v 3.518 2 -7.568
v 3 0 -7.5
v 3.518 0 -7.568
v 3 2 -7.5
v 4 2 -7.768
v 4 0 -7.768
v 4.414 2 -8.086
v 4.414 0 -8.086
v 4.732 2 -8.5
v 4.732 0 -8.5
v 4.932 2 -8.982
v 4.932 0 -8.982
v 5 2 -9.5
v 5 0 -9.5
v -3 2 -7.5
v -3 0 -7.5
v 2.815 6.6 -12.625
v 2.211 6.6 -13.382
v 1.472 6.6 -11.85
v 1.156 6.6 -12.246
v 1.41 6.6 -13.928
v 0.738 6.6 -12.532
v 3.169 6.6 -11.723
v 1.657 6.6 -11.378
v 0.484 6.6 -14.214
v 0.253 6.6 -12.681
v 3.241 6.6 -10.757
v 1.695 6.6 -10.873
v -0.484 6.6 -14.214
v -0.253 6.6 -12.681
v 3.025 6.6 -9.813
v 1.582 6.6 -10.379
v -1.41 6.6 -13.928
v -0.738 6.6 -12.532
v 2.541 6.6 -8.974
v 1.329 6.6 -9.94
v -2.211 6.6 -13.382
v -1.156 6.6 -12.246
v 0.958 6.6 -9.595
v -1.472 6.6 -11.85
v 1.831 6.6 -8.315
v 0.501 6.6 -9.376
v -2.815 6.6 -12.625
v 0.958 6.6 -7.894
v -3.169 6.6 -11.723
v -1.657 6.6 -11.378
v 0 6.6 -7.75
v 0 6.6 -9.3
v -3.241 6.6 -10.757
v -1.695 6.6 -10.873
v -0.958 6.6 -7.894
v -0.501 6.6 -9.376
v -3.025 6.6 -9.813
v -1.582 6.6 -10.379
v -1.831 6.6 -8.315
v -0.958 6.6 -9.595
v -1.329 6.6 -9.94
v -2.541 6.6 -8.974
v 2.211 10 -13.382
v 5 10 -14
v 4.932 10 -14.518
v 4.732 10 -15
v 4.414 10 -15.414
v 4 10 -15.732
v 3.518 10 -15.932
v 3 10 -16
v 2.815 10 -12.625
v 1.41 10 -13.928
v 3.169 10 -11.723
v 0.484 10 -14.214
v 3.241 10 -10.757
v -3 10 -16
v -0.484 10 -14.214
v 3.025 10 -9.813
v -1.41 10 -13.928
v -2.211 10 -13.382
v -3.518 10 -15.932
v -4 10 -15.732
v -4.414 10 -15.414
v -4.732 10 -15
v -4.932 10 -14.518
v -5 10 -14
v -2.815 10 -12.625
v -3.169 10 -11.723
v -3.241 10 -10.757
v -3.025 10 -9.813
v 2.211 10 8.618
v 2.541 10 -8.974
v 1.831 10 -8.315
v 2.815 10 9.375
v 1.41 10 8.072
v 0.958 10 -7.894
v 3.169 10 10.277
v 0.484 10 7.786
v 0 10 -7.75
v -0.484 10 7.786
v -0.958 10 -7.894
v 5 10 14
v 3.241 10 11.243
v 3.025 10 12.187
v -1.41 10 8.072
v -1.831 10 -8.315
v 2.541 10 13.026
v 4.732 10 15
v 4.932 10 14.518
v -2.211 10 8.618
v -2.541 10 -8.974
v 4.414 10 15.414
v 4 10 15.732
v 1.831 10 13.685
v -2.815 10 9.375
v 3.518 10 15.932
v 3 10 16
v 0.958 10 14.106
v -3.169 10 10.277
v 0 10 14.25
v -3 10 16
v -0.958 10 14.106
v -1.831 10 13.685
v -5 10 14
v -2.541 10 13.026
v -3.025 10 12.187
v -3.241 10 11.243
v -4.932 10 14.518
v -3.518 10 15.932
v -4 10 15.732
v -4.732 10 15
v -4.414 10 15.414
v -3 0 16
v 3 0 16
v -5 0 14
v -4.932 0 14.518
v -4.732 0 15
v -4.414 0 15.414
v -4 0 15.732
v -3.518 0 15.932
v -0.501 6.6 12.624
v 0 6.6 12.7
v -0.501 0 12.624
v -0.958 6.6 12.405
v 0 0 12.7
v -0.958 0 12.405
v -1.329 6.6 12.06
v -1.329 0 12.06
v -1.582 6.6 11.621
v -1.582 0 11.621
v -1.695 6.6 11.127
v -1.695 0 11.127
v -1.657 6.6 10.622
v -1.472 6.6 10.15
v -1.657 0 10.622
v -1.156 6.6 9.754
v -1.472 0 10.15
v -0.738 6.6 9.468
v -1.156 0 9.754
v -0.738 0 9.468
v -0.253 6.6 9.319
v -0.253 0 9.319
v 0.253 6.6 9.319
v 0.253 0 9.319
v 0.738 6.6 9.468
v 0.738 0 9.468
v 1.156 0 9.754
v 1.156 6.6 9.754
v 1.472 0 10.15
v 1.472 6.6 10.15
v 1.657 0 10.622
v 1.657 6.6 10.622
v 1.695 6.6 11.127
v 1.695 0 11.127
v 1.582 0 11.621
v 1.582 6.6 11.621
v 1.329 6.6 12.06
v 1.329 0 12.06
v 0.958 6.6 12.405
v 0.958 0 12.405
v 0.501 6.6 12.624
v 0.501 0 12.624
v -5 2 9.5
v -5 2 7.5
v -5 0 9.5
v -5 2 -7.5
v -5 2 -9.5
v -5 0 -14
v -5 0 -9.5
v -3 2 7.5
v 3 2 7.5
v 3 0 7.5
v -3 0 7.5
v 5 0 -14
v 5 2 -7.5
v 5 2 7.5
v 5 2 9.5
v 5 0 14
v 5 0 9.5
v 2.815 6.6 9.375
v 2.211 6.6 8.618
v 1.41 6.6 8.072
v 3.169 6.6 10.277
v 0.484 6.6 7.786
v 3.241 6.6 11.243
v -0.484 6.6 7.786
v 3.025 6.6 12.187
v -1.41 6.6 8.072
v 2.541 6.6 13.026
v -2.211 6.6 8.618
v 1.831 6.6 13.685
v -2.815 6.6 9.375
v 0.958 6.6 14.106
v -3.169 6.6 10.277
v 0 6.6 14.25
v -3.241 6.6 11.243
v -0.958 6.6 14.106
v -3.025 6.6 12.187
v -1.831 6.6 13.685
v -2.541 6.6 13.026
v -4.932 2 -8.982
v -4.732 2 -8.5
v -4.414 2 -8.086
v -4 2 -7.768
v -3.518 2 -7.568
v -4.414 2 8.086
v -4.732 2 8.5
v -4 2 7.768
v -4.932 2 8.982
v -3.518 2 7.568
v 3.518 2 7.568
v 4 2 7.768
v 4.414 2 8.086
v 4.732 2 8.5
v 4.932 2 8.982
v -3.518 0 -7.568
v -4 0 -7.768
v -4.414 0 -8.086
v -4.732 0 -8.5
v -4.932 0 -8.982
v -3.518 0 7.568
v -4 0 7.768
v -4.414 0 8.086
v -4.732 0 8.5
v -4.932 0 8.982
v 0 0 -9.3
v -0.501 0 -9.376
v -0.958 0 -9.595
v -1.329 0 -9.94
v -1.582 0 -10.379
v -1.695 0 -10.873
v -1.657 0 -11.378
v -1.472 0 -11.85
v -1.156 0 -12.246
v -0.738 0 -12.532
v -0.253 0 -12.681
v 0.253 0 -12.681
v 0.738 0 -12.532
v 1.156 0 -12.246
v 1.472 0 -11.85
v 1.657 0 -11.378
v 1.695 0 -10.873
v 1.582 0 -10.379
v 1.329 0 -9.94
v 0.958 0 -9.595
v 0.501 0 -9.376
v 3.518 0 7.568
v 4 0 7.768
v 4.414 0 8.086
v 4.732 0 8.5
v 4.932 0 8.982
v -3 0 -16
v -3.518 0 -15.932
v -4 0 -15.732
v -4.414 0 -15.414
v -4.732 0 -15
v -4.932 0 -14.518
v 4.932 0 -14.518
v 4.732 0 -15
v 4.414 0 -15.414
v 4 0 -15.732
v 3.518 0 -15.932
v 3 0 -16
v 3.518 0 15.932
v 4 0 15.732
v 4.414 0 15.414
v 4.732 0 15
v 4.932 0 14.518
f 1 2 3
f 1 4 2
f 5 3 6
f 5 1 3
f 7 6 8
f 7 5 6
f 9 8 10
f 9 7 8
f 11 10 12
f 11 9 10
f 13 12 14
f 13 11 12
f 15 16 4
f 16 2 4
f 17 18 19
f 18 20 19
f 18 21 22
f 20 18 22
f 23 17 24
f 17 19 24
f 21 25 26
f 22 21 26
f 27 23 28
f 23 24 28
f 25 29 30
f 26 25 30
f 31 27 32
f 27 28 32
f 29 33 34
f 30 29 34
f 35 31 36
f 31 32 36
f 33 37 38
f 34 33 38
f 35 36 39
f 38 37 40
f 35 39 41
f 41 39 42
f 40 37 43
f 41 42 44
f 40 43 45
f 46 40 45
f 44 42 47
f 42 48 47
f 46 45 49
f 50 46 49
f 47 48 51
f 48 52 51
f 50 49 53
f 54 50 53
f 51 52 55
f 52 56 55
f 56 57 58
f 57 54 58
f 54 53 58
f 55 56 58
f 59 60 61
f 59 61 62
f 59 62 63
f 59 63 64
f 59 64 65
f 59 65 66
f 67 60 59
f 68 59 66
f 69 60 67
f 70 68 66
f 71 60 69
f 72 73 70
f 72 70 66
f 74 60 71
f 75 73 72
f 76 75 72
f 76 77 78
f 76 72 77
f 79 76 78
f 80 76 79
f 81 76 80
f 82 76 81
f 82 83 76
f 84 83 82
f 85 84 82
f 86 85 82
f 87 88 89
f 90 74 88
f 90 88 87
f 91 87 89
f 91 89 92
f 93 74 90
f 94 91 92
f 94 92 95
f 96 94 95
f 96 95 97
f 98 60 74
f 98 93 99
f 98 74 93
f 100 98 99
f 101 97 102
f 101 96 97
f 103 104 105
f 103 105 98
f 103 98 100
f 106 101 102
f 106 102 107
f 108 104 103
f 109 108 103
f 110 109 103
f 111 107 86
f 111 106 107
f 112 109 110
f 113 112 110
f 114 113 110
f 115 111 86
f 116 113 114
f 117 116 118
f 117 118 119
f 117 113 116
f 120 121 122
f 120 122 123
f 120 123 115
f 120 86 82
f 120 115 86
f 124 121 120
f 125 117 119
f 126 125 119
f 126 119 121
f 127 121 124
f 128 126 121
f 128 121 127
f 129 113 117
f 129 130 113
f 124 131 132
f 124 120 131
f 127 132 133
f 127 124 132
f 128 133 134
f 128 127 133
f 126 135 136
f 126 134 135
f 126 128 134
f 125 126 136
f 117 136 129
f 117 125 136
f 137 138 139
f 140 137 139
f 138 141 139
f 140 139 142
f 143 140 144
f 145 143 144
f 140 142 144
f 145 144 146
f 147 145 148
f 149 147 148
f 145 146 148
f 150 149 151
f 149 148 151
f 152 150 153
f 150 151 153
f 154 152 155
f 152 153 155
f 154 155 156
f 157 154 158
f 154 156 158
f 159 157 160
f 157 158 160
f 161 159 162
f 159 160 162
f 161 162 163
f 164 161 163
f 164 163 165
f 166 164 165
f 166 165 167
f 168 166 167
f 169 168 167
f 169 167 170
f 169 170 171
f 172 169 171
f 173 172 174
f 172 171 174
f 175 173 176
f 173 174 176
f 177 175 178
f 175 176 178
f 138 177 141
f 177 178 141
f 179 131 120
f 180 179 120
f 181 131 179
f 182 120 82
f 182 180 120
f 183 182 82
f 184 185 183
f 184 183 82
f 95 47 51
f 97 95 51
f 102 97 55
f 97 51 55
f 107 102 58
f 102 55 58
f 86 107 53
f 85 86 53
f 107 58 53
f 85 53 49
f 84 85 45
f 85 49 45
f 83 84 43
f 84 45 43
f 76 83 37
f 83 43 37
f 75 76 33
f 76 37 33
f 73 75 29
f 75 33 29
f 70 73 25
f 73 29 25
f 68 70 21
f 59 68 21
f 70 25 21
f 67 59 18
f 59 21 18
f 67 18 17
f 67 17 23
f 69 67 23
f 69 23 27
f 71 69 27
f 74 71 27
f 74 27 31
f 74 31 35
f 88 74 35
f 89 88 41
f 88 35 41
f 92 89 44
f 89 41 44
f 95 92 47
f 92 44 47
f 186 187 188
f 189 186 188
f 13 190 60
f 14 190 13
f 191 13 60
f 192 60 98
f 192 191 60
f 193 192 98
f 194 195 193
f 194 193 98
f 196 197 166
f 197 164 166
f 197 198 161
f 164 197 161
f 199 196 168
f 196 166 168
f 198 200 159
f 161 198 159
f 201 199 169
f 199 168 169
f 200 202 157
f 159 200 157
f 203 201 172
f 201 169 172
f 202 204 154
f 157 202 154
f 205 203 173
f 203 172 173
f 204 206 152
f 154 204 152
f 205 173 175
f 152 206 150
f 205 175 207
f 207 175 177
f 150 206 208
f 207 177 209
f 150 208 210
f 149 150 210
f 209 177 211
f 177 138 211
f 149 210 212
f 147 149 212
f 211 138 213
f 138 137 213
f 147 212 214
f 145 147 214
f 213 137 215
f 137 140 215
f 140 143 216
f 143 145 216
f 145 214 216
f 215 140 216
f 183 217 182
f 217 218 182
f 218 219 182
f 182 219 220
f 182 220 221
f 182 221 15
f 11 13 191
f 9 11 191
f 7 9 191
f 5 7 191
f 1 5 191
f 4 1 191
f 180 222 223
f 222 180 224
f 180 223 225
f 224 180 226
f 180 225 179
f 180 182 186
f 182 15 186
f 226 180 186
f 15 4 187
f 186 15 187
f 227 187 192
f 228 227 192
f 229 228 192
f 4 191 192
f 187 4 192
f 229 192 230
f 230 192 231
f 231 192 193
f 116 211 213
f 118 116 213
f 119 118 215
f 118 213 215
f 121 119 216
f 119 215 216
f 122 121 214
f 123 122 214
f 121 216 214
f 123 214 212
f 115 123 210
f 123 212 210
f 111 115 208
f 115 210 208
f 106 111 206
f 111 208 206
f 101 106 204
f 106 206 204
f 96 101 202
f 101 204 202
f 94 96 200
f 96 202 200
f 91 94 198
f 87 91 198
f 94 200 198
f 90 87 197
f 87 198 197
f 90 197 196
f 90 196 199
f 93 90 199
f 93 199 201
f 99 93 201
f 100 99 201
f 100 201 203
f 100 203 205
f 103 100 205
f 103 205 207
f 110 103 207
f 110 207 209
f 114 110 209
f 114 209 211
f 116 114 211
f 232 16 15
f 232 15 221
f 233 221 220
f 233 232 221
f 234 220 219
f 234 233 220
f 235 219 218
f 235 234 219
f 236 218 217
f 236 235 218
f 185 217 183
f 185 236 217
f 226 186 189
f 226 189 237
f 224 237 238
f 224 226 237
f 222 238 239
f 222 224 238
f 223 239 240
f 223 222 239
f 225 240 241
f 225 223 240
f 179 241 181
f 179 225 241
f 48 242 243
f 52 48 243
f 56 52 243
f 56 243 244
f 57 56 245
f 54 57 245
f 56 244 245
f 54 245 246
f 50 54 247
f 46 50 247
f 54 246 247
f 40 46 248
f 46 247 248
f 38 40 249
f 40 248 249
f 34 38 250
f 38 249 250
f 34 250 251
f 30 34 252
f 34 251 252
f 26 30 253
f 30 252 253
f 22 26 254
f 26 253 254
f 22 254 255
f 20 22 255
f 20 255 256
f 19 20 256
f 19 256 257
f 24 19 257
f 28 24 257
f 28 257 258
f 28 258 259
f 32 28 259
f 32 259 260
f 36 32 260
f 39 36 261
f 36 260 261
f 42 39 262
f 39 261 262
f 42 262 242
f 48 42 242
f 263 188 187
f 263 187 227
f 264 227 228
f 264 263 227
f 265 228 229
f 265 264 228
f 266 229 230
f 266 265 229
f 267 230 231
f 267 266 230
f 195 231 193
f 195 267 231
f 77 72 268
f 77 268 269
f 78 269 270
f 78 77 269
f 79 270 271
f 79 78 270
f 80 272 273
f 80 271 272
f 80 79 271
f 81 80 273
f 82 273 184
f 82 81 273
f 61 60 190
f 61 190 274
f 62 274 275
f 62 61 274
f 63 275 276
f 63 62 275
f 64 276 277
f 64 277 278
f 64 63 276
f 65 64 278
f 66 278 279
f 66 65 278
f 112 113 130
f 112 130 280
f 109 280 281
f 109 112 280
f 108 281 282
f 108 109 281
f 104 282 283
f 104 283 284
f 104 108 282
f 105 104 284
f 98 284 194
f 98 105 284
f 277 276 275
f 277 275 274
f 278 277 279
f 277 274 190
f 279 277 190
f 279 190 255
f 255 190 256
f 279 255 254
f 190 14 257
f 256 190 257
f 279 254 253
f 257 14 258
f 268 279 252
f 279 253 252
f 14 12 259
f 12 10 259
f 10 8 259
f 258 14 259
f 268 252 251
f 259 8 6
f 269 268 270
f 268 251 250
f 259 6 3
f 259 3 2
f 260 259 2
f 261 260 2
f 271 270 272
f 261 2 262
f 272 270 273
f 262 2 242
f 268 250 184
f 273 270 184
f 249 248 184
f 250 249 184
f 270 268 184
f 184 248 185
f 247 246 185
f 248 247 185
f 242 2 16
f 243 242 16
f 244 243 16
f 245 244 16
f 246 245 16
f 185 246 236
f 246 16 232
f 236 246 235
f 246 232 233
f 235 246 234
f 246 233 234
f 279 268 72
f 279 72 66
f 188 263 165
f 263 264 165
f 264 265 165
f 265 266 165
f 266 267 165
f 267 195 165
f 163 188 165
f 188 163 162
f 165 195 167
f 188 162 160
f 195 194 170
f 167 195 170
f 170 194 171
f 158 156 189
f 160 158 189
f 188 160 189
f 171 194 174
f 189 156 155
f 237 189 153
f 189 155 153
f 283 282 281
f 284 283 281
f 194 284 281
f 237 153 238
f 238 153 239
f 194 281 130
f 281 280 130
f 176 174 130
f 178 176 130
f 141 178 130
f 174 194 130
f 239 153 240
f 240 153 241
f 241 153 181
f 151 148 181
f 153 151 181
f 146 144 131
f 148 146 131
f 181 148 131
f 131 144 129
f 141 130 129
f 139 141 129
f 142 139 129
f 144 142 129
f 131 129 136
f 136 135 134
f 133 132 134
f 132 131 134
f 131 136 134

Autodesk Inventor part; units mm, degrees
ref_plane "YZ Plane" through (0, 0, 0) normal (1, 0, 0) x (0, 1, 0)
ref_plane "XZ Plane" through (0, 0, 0) normal (0, 1, 0) x (-1, 0, 0)
ref_plane "XY Plane" through (0, 0, 0) normal (0, 0, 1) x (1, 0, 0)
sketch "Sketch1" plane through (0, 0, 0) normal (0, 1, 0) x (-1, 0, 0)
  line L0 (-5, 16) -> (5, 16)
  line L1 (5, 16) -> (5, -16)
  line L2 (5, -16) -> (-5, -16)
  line L3 (-5, -16) -> (-5, 16)
  line L4 (-5, 16) -> (5, -16) construction
  line L5 (5, 16) -> (-5, -16) construction
  point P0 (0, 0)
  dimension "d0" = 32
  dimension "d1" = 10
extrude "Extrusion1" add sketch "Sketch1" along normal blind 10
sketch "Sketch2" plane through (0, 10, 0) normal (0, 1, 0) x (1, 0, 0)
  line L0 (0, 22.4) -> (0, -22.4) projected
  line L1 (7, 0) -> (-7, 0) projected
  point P0 (0, 0)
  point P1 (0, -11)
  point P2 (0, 11)
  dimension "d4" = 22
hole "Hole1" at (0, 10, 11) at (0, 10, -11) direction (0, -1, 0) diameter 3.4 depth 10 counterbore diameter 6.5 counterbore depth 3.4 clearance for "Socket Head Cap Screw ISO 4762" size "M3" standard "ISO"
fillet "Fillet1" radius 2 4 edges at (5, 5, 16) (-5, 5, 16) (5, 5, -16) (-5, 5, -16)
sketch "Sketch3" plane through (5, 0, 14) normal (1, 0, 0) x (0, 0, -1)
  line L0 (28, 0) -> (0, 0) projected
  line L1 (6.5, 0) -> (21.5, 0)
  line L2 (21.5, 0) -> (21.5, 2)
  line L3 (21.5, 2) -> (6.5, 2)
  line L4 (6.5, 2) -> (6.5, 0)
  line L5 (14, -2) -> (14, 12) projected
  point P0 (14, 0)
  dimension "d13" = 15
  dimension "d14" = 2
extrude "Extrusion2" cut sketch "Sketch3" against normal through all
fillet "Fillet2" radius 2 4 edges at (5, 1, 7.5) (-5, 1, 7.5) (5, 1, -7.5) (-5, 1, -7.5)
properties part number "32_Y-Motor_cable_holder_B"
